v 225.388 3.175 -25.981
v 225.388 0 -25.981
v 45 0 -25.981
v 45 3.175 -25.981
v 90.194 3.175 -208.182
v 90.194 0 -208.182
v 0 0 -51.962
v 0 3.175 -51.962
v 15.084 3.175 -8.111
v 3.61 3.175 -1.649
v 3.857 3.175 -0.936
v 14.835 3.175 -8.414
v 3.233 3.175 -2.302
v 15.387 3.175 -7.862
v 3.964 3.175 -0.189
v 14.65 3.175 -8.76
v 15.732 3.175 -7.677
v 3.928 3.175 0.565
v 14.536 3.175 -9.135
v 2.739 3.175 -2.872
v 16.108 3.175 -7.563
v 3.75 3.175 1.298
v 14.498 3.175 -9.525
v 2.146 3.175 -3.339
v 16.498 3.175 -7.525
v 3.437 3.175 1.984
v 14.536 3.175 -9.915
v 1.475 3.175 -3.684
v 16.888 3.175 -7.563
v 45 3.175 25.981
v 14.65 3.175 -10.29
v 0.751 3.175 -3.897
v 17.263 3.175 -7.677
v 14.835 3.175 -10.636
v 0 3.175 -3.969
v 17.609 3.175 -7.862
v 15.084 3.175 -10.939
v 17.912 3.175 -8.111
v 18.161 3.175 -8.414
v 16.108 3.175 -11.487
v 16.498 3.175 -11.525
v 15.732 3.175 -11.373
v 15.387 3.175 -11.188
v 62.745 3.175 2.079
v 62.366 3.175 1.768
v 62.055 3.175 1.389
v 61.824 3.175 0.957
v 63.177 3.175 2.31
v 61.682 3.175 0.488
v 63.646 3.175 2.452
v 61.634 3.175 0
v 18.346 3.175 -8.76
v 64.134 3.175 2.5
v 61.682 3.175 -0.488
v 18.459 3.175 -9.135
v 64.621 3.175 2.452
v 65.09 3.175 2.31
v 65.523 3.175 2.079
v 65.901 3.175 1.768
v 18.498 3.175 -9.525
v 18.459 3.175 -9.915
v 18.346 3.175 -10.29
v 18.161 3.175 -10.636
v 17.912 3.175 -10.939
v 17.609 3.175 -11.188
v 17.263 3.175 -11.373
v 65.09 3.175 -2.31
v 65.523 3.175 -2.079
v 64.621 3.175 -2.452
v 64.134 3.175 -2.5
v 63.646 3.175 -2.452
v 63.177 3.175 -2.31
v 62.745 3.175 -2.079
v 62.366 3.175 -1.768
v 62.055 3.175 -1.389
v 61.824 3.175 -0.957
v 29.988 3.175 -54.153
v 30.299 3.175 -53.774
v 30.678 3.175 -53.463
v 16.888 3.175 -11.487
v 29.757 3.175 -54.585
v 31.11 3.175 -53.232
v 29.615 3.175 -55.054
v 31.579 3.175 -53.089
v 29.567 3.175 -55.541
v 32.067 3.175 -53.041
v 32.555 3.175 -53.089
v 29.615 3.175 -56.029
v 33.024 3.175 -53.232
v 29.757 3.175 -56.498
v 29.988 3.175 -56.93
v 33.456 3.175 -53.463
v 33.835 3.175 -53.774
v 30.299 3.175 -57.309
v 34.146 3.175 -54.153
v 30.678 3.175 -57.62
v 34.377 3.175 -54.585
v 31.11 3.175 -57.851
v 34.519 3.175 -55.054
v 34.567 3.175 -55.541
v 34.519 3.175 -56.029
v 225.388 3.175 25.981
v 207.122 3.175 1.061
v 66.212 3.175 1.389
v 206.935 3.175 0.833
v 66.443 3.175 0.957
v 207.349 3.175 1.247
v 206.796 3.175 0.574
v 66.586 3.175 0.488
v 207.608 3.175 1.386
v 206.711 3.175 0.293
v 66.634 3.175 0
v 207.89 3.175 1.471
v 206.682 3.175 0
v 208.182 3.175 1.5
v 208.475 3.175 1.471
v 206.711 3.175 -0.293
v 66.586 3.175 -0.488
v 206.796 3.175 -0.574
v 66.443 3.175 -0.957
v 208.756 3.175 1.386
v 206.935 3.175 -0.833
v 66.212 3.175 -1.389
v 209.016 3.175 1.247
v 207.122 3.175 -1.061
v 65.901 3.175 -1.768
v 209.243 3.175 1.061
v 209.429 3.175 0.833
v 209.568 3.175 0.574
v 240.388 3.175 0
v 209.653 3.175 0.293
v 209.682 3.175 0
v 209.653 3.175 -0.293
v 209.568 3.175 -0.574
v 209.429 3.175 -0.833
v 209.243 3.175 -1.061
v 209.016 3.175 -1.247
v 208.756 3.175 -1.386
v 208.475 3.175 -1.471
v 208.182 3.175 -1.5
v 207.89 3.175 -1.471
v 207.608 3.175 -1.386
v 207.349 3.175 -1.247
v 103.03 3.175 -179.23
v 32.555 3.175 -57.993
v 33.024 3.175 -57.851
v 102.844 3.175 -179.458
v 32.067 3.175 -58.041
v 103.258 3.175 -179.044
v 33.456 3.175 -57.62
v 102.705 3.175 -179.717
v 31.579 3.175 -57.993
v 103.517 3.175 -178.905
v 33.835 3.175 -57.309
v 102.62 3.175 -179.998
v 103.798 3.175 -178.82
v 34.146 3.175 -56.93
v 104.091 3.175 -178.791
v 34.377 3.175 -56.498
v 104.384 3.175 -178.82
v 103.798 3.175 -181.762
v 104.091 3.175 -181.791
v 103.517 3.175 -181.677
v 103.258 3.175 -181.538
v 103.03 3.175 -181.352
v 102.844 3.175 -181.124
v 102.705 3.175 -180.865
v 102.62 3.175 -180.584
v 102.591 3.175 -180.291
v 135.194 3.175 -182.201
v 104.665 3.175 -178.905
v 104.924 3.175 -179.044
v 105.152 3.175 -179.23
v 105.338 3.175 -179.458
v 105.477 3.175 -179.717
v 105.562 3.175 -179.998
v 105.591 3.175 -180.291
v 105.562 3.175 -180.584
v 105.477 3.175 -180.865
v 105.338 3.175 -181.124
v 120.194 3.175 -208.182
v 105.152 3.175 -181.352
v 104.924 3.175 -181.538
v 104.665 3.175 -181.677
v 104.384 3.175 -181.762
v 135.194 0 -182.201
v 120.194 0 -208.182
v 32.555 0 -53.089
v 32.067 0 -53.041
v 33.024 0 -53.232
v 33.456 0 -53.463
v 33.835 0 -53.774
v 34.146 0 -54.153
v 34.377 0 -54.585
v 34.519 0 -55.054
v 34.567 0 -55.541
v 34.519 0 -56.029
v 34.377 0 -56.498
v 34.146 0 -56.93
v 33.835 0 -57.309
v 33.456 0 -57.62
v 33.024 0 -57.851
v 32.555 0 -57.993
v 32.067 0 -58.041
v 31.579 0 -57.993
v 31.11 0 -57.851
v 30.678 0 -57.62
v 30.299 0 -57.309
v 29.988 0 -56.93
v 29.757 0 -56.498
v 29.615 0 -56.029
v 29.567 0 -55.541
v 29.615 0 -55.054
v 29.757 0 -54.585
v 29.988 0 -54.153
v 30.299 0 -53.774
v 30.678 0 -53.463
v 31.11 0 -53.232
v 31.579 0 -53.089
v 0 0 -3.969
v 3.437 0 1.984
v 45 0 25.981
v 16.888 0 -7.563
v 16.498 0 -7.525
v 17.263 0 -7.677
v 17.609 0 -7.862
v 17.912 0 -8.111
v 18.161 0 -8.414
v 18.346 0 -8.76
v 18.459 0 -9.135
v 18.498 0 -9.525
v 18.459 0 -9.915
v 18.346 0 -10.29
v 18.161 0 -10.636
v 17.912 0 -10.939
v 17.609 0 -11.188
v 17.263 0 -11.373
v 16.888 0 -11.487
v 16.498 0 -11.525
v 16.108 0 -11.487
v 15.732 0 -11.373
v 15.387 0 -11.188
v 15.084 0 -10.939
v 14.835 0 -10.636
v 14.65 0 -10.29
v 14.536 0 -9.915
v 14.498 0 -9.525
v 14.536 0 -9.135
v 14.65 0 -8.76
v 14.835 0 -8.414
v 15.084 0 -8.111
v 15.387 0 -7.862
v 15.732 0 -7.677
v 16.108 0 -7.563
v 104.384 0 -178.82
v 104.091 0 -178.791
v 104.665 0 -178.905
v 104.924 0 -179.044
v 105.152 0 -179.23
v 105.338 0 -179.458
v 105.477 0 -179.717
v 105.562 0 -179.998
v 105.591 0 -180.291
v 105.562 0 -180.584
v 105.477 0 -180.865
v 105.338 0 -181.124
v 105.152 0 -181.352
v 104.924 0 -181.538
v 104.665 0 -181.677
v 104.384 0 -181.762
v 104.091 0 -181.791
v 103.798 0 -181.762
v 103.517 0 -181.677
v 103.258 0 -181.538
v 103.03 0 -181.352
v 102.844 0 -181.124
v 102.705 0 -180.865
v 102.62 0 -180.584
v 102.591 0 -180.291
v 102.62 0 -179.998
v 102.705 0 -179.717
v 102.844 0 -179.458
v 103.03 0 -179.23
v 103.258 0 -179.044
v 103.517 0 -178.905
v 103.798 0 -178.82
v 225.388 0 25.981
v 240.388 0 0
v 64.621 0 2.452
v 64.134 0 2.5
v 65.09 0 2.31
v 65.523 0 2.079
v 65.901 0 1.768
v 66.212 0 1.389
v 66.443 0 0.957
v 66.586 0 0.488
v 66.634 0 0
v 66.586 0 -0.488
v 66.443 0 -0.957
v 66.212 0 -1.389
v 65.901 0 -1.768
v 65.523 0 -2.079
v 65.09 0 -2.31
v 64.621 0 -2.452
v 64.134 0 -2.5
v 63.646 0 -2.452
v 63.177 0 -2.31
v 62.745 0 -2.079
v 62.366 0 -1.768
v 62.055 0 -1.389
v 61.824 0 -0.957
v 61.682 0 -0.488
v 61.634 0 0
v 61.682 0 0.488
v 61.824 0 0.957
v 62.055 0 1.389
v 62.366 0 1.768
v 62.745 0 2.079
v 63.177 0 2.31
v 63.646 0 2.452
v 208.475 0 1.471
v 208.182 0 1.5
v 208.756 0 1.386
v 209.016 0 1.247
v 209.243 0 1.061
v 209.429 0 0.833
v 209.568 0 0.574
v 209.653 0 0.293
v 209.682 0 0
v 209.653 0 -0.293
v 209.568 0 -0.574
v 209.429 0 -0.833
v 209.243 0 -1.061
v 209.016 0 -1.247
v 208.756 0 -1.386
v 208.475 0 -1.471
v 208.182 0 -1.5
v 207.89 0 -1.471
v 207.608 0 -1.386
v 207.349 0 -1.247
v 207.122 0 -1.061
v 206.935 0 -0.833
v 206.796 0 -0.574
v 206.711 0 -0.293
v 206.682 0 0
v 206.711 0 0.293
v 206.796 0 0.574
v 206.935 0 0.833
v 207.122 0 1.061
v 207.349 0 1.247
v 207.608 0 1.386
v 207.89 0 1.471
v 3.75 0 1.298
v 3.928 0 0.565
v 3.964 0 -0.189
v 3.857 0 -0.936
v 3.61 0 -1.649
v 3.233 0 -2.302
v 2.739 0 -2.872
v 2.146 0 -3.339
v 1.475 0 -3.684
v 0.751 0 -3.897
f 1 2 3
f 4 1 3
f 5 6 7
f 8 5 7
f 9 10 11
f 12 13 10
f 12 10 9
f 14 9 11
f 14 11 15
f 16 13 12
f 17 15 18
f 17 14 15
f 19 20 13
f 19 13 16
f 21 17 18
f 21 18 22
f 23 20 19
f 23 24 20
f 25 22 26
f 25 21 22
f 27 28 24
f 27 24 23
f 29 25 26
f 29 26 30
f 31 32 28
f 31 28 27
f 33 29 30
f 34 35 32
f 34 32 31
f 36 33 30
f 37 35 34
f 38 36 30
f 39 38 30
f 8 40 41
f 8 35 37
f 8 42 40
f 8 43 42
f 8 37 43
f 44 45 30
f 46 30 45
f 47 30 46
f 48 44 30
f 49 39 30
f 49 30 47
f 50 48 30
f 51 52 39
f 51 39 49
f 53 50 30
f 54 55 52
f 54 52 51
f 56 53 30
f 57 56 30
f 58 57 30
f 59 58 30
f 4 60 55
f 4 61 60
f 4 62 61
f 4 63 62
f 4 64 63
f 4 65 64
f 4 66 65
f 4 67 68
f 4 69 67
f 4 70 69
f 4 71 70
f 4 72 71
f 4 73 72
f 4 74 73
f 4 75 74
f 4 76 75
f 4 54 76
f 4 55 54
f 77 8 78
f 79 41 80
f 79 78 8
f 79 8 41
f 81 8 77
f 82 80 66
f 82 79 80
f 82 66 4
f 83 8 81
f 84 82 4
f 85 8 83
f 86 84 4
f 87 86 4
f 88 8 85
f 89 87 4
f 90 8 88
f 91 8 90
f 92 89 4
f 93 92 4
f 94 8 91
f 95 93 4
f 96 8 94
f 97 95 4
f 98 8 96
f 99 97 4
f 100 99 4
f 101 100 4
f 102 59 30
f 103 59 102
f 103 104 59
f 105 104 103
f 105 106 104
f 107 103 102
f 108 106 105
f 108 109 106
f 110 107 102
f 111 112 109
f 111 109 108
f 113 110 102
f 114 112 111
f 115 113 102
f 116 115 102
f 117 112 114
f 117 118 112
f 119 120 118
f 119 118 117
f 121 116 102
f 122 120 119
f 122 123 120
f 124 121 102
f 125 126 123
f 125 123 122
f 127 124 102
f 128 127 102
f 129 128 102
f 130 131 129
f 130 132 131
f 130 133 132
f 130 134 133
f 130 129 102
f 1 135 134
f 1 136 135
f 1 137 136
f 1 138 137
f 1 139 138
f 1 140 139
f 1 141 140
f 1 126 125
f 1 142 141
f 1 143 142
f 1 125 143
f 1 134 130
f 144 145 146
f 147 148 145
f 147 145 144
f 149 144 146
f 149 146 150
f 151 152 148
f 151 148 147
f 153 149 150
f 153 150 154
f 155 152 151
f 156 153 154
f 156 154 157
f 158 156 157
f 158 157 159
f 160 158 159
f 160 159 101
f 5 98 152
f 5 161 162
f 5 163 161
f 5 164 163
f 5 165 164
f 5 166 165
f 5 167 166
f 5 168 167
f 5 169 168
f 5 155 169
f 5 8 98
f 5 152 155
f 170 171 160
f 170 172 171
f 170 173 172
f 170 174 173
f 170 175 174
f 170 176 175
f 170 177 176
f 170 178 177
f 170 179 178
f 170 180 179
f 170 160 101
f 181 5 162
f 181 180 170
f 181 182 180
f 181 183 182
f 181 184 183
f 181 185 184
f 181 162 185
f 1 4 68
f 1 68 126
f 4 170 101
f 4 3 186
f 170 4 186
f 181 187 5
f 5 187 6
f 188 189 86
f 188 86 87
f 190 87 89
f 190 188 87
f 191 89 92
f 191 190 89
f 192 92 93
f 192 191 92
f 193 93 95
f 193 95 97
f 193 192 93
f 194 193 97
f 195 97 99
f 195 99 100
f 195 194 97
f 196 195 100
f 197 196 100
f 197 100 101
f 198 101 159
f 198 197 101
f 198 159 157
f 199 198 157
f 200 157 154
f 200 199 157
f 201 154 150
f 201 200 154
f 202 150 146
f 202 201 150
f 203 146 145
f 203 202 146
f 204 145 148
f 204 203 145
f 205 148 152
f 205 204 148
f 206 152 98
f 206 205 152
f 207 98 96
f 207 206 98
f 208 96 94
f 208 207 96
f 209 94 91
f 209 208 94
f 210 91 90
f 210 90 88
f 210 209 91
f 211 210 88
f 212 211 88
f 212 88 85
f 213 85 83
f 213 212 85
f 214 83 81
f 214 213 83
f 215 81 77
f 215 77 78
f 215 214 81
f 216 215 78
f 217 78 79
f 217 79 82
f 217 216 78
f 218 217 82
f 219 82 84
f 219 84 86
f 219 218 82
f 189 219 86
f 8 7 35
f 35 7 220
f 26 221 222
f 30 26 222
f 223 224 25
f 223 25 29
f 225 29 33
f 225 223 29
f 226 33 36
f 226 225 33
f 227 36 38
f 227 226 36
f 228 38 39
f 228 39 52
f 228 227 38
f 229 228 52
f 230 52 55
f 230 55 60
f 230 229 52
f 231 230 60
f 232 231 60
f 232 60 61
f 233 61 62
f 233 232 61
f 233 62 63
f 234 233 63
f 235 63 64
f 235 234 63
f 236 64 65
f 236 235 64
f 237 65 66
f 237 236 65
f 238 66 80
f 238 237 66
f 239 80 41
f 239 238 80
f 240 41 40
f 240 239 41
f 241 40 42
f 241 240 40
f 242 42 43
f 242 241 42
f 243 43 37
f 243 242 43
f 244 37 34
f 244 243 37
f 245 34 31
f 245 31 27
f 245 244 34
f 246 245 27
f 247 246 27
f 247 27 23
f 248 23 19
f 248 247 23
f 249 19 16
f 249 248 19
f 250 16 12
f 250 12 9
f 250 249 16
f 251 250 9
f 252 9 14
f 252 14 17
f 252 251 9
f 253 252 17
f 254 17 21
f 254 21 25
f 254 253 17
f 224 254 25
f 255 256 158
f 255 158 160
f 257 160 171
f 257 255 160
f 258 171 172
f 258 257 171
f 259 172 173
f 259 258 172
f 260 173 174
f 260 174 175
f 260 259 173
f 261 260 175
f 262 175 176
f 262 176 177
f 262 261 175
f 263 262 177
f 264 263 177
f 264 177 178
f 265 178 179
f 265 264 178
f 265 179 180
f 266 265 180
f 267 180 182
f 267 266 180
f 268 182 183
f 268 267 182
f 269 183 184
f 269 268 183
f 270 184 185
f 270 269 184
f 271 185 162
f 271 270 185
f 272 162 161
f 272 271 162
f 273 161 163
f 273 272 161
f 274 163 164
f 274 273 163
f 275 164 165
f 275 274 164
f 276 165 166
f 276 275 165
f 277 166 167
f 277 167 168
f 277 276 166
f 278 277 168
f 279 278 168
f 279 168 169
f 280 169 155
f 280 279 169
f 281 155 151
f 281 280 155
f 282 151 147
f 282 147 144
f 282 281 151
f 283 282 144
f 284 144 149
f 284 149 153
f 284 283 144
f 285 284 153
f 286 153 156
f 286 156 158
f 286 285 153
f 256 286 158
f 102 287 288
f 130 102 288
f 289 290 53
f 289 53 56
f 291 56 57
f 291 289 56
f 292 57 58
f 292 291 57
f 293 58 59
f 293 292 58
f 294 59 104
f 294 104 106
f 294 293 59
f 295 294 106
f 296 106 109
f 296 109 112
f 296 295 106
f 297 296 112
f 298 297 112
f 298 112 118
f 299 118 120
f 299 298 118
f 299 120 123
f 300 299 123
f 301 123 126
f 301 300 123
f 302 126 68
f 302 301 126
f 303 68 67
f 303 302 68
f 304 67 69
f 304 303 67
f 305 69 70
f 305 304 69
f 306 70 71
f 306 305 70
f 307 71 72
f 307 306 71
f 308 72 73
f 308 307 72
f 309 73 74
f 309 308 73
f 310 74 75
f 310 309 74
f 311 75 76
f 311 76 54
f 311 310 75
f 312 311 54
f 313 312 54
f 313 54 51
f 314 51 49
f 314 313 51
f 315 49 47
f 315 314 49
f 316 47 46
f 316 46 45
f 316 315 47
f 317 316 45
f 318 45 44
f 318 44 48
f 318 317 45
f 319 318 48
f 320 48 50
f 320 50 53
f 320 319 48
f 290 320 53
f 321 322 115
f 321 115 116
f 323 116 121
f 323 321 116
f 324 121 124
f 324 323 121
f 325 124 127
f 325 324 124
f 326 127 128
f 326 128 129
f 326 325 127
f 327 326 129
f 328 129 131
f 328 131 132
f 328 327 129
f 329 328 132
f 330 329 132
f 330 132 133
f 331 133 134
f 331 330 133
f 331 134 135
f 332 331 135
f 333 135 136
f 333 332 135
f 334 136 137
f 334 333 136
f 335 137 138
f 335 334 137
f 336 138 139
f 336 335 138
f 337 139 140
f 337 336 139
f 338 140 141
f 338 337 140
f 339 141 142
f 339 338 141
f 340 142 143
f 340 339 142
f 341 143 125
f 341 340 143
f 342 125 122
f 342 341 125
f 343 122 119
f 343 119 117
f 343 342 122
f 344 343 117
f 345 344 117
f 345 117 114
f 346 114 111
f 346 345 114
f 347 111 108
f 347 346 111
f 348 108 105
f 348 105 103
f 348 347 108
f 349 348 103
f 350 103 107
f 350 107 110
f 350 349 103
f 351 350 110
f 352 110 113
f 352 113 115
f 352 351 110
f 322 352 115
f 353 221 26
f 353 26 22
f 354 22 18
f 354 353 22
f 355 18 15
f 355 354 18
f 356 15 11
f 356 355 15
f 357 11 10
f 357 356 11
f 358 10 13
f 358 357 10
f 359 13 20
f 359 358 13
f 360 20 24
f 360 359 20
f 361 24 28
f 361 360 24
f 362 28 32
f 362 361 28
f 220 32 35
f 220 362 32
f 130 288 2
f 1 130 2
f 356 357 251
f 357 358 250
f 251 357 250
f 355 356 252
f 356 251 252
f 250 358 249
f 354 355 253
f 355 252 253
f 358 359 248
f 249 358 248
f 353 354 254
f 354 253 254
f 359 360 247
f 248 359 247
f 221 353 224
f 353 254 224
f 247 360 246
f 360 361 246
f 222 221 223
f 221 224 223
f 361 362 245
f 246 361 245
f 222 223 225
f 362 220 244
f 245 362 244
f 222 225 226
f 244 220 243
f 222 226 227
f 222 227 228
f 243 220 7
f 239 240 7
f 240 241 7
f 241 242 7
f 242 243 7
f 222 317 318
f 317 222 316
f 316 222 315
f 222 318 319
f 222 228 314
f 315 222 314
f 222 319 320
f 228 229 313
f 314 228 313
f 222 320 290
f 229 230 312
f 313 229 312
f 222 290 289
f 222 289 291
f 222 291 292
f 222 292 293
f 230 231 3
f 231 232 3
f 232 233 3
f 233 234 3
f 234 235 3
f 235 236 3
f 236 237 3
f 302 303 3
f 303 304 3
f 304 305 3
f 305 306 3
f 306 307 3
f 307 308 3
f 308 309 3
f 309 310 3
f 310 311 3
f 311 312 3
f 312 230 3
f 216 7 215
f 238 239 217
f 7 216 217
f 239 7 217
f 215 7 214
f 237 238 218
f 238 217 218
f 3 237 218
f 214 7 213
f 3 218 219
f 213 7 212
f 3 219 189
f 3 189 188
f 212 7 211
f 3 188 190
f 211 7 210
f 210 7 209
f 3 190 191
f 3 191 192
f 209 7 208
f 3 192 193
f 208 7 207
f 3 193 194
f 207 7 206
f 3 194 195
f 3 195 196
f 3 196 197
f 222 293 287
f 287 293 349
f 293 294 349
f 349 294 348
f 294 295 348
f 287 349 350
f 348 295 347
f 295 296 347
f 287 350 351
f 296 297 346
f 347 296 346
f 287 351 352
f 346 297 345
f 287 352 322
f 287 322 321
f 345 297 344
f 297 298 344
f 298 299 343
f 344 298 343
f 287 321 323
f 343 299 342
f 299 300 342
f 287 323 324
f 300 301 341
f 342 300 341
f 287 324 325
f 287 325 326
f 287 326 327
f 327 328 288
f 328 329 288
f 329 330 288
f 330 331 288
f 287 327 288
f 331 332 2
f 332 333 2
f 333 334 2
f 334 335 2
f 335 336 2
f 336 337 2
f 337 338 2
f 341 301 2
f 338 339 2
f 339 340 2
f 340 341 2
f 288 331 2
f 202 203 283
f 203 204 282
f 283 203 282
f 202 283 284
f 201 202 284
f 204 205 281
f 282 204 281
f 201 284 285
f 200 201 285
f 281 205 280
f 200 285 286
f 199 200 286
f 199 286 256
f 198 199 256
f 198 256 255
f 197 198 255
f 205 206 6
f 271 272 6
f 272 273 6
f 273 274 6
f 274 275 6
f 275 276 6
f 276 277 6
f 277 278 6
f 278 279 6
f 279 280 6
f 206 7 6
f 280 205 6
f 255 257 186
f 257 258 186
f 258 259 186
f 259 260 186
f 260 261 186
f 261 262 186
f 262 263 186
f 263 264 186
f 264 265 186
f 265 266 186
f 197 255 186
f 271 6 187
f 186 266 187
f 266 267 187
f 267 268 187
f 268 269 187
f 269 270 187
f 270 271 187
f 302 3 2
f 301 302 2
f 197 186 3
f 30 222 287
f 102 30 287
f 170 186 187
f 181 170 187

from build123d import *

# Parameters (mm, degrees)
SKETCH1_R           = 1.5
SKETCH1_R_2         = 2
SKETCH1_R_3         = 2.5
SKETCH1_R_4         = 3.96875
BOSS_EXTRUDE1_DEPTH = 3.175
CUT_EXTRUDE1_START  = -3.175
SKETCH2_R           = 3.96875
SKETCH2_R_2         = 1.5
SKETCH2_R_3         = 2
SKETCH2_R_4         = 2.5
CUT_EXTRUDE1_DEPTH  = 3.175


with BuildPart() as part:
    # Sketch1 → Boss-Extrude1 (new body)
    with BuildSketch(Plane(origin=(0, 0, 0), x_dir=(1, 0, 0), z_dir=(0, 1, 0))):
        Polygon((240.38814, 0), (225.38814, 25.980762114), (45, 25.980762114), (135.19407, 182.201473895), (120.19407, 208.182236008), (90.19407, 208.182236008), (0, 51.961524227), (-90.19407, 208.182236008), (-120.19407, 208.182236008), (-135.19407, 182.201473895), (-45, 25.980762114), (-225.38814, 25.980762114), (-240.38814, 0), (-225.38814, -25.980762114), (-45, -25.980762114), (-135.19407, -182.201473895), (-120.19407, -208.182236008), (-90.19407, -208.182236008), (0, -51.961524227), (90.19407, -208.182236008), (120.19407, -208.182236008), (135.19407, -182.201473895), (45, -25.980762114), (225.38814, -25.980762114), align=None)
        with Locations(Location((208.18221, 0, 0), (0, 0, 270))):
            Circle(SKETCH1_R, mode=Mode.SUBTRACT)
        with Locations(Location((104.091105, -180.291082476, 0), (0, 0, 270))):
            Circle(SKETCH1_R, mode=Mode.SUBTRACT)
        with Locations(Location((-104.091105, -180.291082476, 0), (0, 0, 270))):
            Circle(SKETCH1_R, mode=Mode.SUBTRACT)
        with Locations(Location((-208.18221, 0, 0), (0, 0, 270))):
            Circle(SKETCH1_R, mode=Mode.SUBTRACT)
        with Locations(Location((-104.091105, 180.291082476, 0), (0, 0, 270))):
            Circle(SKETCH1_R, mode=Mode.SUBTRACT)
        with Locations(Location((104.091105, 180.291082476, 0), (0, 0, 270))):
            Circle(SKETCH1_R, mode=Mode.SUBTRACT)
        with Locations(Location((16.497783942, 9.525, 0), (0, 0, 270))):
            Circle(SKETCH1_R_2, mode=Mode.SUBTRACT)
        with Locations(Location((0, -19.05, 0), (0, 0, 270))):
            Circle(SKETCH1_R_2, mode=Mode.SUBTRACT)
        with Locations(Location((-16.497783942, 9.525, 0), (0, 0, 270))):
            Circle(SKETCH1_R_2, mode=Mode.SUBTRACT)
        with Locations(Location((32.066865, 55.541439419, 0), (0, 0, 270))):
            Circle(SKETCH1_R_3, mode=Mode.SUBTRACT)
        with Locations(Location((64.13373, 0, 0), (0, 0, 270))):
            Circle(SKETCH1_R_3, mode=Mode.SUBTRACT)
        with Locations(Location((32.066865, -55.541439419, 0), (0, 0, 270))):
            Circle(SKETCH1_R_3, mode=Mode.SUBTRACT)
        with Locations(Location((-32.066865, -55.541439419, 0), (0, 0, 270))):
            Circle(SKETCH1_R_3, mode=Mode.SUBTRACT)
        with Locations(Location((-64.13373, 0, 0), (0, 0, 270))):
            Circle(SKETCH1_R_3, mode=Mode.SUBTRACT)
        with Locations(Location((-32.066865, 55.541439419, 0), (0, 0, 270))):
            Circle(SKETCH1_R_3, mode=Mode.SUBTRACT)
        with Locations(Location((0, 0, 0), (0, 0, 270))):
            Circle(SKETCH1_R_4, mode=Mode.SUBTRACT)
    extrude(amount=BOSS_EXTRUDE1_DEPTH)

    # Sketch2 → Cut-Extrude1 (cut)
    # profile 1 of 3: a face of its own
    with BuildSketch(Plane(origin=(0, 3.175, 0), x_dir=(1, 0, 0), z_dir=(0, 1, 0)).offset(CUT_EXTRUDE1_START)):
        with BuildLine():
            ThreePointArc((228.675327889, -132.025762114), (-228.675327889, -132.025762114), (0, 264.051524227))
            Line((0, 264.051524227), (0, 51.961524227))
            Line((0, 51.961524227), (-90.19407, 208.182236008))
            Line((-90.19407, 208.182236008), (-120.19407, 208.182236008))
            Line((-120.19407, 208.182236008), (-135.19407, 182.201473895))
            Line((-135.19407, 182.201473895), (-45, 25.980762114))
            Line((-45, 25.980762114), (-225.38814, 25.980762114))
            Line((-225.38814, 25.980762114), (-240.38814, 0))
            Line((-240.38814, 0), (-225.38814, -25.980762114))
            Line((-225.38814, -25.980762114), (-45, -25.980762114))
            Line((-45, -25.980762114), (-135.19407, -182.201473895))
            Line((-135.19407, -182.201473895), (-120.19407, -208.182236008))
            Line((-120.19407, -208.182236008), (-90.19407, -208.182236008))
            Line((-90.19407, -208.182236008), (0, -51.961524227))
            Line((0, -51.961524227), (90.19407, -208.182236008))
            Line((90.19407, -208.182236008), (120.19407, -208.182236008))
            Line((120.19407, -208.182236008), (135.19407, -182.201473895))
            Line((135.19407, -182.201473895), (45, -25.980762114))
            Line((45, -25.980762114), (228.675327889, -132.025762114))
        make_face()
    # profile 2 of 3: a face of its own
    with BuildSketch(Plane(origin=(0, 3.175, 0), x_dir=(1, 0, 0), z_dir=(0, 1, 0)).offset(CUT_EXTRUDE1_START)):
        Circle(SKETCH2_R)
    # profile 3 of 3: a face of its own
    with BuildSketch(Plane(origin=(0, 3.175, 0), x_dir=(1, 0, 0), z_dir=(0, 1, 0)).offset(CUT_EXTRUDE1_START)):
        Polygon((0, 0), (45, -25.980762114), (135.19407, -182.201473895), (120.19407, -208.182236008), (90.19407, -208.182236008), (0, -51.961524227), (-90.19407, -208.182236008), (-120.19407, -208.182236008), (-135.19407, -182.201473895), (-45, -25.980762114), (-225.38814, -25.980762114), (-240.38814, 0), (-225.38814, 25.980762114), (-45, 25.980762114), (-135.19407, 182.201473895), (-120.19407, 208.182236008), (-90.19407, 208.182236008), (0, 51.961524227), align=None)
        with Locations((104.091105, -180.291082476)):
            Circle(SKETCH2_R_2, mode=Mode.SUBTRACT)
        with Locations((-208.18221, 0)):
            Circle(SKETCH2_R_2, mode=Mode.SUBTRACT)
        with Locations((-104.091105, 180.291082476)):
            Circle(SKETCH2_R_2, mode=Mode.SUBTRACT)
        with Locations((-16.497783942, 9.525)):
            Circle(SKETCH2_R_3, mode=Mode.SUBTRACT)
        with Locations((0, -19.05)):
            Circle(SKETCH2_R_3, mode=Mode.SUBTRACT)
        with Locations((-32.066865, 55.541439419)):
            Circle(SKETCH2_R_4, mode=Mode.SUBTRACT)
        with Locations((-64.13373, 0)):
            Circle(SKETCH2_R_4, mode=Mode.SUBTRACT)
        with Locations((-32.066865, -55.541439419)):
            Circle(SKETCH2_R_4, mode=Mode.SUBTRACT)
        with Locations((-104.091105, -180.291082476)):
            Circle(SKETCH2_R_2, mode=Mode.SUBTRACT)
        with Locations((32.066865, -55.541439419)):
            Circle(SKETCH2_R_4, mode=Mode.SUBTRACT)
    extrude(amount=CUT_EXTRUDE1_DEPTH, mode=Mode.SUBTRACT)


solid = part.part
